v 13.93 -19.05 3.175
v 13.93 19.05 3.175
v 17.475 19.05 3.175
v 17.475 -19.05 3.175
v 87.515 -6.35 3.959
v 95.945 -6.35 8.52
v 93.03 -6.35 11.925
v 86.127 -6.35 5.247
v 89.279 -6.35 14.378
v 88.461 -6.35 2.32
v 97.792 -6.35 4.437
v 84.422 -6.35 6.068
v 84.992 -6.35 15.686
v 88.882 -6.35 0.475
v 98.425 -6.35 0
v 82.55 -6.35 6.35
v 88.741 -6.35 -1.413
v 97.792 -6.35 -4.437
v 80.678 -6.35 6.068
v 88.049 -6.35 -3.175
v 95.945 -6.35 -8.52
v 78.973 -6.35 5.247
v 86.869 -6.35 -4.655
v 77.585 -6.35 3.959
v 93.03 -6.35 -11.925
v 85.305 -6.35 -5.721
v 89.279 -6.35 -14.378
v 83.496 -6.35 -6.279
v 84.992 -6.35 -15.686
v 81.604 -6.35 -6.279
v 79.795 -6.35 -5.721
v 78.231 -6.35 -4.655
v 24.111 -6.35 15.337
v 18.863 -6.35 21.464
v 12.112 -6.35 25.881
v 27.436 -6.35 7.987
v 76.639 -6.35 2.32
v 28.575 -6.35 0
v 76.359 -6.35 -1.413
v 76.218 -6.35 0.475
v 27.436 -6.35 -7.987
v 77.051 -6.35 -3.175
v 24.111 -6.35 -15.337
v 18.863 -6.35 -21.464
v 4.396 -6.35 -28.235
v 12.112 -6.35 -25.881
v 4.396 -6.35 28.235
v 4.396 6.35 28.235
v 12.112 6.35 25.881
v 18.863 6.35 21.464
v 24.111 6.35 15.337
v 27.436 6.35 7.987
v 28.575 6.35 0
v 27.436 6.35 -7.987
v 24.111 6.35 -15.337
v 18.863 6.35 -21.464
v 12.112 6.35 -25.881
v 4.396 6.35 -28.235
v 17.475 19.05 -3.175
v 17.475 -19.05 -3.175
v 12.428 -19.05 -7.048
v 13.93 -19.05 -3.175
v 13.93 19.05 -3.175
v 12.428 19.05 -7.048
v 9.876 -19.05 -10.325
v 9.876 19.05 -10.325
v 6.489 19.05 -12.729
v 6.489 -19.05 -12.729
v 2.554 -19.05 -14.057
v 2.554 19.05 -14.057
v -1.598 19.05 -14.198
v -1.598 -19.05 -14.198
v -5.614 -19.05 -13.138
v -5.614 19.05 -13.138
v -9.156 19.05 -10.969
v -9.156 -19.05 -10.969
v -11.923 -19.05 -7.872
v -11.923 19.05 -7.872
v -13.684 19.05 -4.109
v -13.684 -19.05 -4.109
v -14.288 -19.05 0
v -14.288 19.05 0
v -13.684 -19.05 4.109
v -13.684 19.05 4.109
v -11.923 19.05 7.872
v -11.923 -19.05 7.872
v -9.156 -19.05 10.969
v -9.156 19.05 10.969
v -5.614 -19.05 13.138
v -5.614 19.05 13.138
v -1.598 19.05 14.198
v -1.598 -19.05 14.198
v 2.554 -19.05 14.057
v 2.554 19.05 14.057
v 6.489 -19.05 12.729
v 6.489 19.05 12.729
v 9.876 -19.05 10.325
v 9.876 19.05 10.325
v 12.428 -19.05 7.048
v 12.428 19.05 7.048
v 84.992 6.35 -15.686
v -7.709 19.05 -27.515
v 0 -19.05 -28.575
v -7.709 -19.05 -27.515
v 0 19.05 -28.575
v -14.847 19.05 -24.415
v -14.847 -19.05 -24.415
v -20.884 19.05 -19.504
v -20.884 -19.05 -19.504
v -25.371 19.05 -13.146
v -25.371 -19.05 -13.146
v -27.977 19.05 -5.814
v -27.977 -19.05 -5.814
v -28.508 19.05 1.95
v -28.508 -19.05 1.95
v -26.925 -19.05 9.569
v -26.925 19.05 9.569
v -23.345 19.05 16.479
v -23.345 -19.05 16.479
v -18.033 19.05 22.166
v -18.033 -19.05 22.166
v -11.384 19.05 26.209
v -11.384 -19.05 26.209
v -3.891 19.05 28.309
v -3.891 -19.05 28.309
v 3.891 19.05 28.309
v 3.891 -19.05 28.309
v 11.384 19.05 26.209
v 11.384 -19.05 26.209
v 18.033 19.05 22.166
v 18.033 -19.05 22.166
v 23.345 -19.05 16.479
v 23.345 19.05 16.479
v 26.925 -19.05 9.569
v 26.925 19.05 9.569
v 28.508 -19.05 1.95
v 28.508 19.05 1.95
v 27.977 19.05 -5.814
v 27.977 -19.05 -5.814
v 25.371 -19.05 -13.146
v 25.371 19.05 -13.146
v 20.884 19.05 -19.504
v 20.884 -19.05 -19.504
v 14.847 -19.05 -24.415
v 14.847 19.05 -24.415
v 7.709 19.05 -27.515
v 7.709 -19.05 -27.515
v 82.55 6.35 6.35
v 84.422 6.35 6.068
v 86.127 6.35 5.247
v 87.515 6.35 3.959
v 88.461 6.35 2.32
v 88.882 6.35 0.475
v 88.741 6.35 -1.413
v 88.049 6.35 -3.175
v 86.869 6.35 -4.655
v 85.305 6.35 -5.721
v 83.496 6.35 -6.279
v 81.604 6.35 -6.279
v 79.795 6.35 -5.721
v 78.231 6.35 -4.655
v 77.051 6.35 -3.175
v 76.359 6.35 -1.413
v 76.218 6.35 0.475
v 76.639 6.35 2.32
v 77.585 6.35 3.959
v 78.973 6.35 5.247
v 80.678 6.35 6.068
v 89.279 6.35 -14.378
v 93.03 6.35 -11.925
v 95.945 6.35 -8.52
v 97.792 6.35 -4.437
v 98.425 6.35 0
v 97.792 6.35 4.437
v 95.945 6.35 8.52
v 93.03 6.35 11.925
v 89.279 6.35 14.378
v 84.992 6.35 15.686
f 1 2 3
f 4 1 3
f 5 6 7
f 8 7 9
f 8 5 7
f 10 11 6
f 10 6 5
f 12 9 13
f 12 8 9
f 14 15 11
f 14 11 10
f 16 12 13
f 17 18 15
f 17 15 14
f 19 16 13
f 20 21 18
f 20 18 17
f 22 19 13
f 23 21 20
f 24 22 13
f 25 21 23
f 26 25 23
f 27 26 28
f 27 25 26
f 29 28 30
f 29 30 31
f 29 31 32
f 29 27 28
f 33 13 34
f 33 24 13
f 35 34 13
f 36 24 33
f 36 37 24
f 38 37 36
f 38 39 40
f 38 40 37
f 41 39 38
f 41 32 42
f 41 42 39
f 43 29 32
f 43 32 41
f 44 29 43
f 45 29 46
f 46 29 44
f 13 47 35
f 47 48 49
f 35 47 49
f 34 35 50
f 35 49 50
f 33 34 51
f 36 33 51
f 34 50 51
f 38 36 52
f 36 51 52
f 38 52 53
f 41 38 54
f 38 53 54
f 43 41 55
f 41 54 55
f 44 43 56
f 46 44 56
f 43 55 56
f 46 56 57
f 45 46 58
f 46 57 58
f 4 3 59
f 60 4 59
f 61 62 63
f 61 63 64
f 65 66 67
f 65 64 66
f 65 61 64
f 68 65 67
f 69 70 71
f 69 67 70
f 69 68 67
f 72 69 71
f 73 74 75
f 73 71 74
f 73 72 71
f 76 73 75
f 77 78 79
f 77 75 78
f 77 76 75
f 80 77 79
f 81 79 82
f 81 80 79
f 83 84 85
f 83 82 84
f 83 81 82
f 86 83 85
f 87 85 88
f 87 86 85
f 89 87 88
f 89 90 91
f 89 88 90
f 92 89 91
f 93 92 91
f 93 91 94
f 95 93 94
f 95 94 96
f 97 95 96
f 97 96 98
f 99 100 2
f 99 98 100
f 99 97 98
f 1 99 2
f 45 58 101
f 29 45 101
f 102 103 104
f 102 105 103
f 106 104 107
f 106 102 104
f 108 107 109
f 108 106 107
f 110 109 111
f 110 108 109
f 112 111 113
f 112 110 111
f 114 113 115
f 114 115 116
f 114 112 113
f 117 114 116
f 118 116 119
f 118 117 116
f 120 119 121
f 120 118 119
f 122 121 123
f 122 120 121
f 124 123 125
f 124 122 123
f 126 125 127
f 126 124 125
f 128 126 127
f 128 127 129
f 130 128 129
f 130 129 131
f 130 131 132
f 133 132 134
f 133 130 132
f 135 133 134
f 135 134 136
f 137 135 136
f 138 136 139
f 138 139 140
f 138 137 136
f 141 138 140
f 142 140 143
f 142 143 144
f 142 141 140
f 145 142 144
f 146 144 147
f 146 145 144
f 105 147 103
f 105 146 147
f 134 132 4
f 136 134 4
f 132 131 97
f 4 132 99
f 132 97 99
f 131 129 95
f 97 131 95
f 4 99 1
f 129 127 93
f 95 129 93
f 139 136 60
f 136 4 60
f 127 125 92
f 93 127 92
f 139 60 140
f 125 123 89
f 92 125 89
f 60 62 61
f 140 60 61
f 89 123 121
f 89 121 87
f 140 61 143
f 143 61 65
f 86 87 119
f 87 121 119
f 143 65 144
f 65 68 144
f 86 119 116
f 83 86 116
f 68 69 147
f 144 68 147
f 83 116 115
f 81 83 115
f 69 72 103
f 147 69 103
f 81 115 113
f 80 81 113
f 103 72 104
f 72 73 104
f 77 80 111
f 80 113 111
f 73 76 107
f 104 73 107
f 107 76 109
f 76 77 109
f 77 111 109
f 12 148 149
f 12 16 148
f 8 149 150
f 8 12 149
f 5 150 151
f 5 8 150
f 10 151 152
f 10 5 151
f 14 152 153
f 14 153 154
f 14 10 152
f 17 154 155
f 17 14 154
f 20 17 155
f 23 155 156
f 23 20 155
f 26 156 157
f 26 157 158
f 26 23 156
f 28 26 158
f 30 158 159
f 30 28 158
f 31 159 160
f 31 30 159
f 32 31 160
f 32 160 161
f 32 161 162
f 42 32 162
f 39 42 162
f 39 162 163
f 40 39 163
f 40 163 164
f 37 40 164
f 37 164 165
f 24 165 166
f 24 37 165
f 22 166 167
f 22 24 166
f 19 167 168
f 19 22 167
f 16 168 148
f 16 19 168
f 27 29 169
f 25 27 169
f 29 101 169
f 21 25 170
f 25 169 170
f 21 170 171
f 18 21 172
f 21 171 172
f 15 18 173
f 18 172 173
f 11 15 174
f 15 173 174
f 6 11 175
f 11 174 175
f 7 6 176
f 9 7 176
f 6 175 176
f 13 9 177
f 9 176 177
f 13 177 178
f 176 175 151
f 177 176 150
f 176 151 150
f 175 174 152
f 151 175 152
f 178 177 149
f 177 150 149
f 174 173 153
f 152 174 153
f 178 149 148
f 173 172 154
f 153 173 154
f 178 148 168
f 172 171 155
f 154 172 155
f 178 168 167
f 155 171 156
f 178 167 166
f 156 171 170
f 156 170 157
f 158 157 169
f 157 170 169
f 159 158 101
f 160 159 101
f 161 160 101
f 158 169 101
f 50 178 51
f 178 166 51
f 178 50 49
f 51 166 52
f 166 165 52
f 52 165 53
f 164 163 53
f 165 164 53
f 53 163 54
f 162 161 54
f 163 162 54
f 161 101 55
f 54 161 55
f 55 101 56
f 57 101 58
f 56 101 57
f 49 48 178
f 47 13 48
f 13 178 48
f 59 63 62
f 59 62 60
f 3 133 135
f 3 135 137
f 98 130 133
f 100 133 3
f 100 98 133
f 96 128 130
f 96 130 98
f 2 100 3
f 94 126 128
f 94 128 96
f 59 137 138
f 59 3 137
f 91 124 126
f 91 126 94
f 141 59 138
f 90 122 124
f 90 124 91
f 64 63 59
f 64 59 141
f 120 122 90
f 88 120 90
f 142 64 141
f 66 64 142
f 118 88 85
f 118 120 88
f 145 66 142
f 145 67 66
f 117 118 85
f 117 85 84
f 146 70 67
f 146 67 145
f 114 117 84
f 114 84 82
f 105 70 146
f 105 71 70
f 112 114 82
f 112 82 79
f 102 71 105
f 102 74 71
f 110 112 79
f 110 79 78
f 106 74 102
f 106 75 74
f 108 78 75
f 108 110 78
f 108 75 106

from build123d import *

# Parameters (mm, degrees)
SKETCH4_R           = 28.575
SKETCH4_R_2         = 14.2875
BOSS_EXTRUDE1_DEPTH = 19.05
SKETCH5_R           = 6.35
BOSS_EXTRUDE2_DEPTH = 6.35
SKETCH6_W           = 17.4752
SKETCH6_H           = 6.35
CUT_EXTRUDE2_DEPTH  = 38.1


with BuildPart() as part:
    # Sketch4 → Boss-Extrude1 (new, symmetric)
    with BuildSketch(Plane(origin=(0, 0, 0), x_dir=(1, 0, 0), z_dir=(0, 1, 0))):
        with Locations(Location((0, 0, 0), (0, 0, 90))):
            Circle(SKETCH4_R)
        with Locations(Location((0, 0, 0), (0, 0, 90))):
            Circle(SKETCH4_R_2, mode=Mode.SUBTRACT)
    extrude(amount=BOSS_EXTRUDE1_DEPTH, both=True)

    # Sketch6 → Cut-Extrude2 (cut)
    with BuildSketch(Plane(origin=(0, 19.05, 0), x_dir=(1, 0, 0), z_dir=(0, 1, 0))):
        with Locations((8.7376, 0)):
            Rectangle(SKETCH6_W, SKETCH6_H)
    extrude(amount=-CUT_EXTRUDE2_DEPTH, mode=Mode.SUBTRACT)


with BuildPart() as body_2:
    # Sketch5 → Boss-Extrude2 (new, symmetric)
    with BuildSketch(Plane(origin=(0, 0, 0), x_dir=(1, 0, 0), z_dir=(0, 1, 0))):
        with BuildLine():
            Line((4.396153846, 28.234809303), (84.992307692, 15.686005168))
            ThreePointArc((84.992307692, 15.686005168), (98.425, 0), (84.992307692, -15.686005168))
            Line((84.992307692, -15.686005168), (4.396153846, -28.234809303))
            ThreePointArc((4.396153846, -28.234809303), (28.575, 0), (4.396153846, 28.234809303))
        make_face()
        with Locations(Location((82.55, 0, 0), (0, 0, 270))):
            Circle(SKETCH5_R, mode=Mode.SUBTRACT)
    extrude(amount=BOSS_EXTRUDE2_DEPTH, both=True)


solid = Compound([part.part, body_2.part])
